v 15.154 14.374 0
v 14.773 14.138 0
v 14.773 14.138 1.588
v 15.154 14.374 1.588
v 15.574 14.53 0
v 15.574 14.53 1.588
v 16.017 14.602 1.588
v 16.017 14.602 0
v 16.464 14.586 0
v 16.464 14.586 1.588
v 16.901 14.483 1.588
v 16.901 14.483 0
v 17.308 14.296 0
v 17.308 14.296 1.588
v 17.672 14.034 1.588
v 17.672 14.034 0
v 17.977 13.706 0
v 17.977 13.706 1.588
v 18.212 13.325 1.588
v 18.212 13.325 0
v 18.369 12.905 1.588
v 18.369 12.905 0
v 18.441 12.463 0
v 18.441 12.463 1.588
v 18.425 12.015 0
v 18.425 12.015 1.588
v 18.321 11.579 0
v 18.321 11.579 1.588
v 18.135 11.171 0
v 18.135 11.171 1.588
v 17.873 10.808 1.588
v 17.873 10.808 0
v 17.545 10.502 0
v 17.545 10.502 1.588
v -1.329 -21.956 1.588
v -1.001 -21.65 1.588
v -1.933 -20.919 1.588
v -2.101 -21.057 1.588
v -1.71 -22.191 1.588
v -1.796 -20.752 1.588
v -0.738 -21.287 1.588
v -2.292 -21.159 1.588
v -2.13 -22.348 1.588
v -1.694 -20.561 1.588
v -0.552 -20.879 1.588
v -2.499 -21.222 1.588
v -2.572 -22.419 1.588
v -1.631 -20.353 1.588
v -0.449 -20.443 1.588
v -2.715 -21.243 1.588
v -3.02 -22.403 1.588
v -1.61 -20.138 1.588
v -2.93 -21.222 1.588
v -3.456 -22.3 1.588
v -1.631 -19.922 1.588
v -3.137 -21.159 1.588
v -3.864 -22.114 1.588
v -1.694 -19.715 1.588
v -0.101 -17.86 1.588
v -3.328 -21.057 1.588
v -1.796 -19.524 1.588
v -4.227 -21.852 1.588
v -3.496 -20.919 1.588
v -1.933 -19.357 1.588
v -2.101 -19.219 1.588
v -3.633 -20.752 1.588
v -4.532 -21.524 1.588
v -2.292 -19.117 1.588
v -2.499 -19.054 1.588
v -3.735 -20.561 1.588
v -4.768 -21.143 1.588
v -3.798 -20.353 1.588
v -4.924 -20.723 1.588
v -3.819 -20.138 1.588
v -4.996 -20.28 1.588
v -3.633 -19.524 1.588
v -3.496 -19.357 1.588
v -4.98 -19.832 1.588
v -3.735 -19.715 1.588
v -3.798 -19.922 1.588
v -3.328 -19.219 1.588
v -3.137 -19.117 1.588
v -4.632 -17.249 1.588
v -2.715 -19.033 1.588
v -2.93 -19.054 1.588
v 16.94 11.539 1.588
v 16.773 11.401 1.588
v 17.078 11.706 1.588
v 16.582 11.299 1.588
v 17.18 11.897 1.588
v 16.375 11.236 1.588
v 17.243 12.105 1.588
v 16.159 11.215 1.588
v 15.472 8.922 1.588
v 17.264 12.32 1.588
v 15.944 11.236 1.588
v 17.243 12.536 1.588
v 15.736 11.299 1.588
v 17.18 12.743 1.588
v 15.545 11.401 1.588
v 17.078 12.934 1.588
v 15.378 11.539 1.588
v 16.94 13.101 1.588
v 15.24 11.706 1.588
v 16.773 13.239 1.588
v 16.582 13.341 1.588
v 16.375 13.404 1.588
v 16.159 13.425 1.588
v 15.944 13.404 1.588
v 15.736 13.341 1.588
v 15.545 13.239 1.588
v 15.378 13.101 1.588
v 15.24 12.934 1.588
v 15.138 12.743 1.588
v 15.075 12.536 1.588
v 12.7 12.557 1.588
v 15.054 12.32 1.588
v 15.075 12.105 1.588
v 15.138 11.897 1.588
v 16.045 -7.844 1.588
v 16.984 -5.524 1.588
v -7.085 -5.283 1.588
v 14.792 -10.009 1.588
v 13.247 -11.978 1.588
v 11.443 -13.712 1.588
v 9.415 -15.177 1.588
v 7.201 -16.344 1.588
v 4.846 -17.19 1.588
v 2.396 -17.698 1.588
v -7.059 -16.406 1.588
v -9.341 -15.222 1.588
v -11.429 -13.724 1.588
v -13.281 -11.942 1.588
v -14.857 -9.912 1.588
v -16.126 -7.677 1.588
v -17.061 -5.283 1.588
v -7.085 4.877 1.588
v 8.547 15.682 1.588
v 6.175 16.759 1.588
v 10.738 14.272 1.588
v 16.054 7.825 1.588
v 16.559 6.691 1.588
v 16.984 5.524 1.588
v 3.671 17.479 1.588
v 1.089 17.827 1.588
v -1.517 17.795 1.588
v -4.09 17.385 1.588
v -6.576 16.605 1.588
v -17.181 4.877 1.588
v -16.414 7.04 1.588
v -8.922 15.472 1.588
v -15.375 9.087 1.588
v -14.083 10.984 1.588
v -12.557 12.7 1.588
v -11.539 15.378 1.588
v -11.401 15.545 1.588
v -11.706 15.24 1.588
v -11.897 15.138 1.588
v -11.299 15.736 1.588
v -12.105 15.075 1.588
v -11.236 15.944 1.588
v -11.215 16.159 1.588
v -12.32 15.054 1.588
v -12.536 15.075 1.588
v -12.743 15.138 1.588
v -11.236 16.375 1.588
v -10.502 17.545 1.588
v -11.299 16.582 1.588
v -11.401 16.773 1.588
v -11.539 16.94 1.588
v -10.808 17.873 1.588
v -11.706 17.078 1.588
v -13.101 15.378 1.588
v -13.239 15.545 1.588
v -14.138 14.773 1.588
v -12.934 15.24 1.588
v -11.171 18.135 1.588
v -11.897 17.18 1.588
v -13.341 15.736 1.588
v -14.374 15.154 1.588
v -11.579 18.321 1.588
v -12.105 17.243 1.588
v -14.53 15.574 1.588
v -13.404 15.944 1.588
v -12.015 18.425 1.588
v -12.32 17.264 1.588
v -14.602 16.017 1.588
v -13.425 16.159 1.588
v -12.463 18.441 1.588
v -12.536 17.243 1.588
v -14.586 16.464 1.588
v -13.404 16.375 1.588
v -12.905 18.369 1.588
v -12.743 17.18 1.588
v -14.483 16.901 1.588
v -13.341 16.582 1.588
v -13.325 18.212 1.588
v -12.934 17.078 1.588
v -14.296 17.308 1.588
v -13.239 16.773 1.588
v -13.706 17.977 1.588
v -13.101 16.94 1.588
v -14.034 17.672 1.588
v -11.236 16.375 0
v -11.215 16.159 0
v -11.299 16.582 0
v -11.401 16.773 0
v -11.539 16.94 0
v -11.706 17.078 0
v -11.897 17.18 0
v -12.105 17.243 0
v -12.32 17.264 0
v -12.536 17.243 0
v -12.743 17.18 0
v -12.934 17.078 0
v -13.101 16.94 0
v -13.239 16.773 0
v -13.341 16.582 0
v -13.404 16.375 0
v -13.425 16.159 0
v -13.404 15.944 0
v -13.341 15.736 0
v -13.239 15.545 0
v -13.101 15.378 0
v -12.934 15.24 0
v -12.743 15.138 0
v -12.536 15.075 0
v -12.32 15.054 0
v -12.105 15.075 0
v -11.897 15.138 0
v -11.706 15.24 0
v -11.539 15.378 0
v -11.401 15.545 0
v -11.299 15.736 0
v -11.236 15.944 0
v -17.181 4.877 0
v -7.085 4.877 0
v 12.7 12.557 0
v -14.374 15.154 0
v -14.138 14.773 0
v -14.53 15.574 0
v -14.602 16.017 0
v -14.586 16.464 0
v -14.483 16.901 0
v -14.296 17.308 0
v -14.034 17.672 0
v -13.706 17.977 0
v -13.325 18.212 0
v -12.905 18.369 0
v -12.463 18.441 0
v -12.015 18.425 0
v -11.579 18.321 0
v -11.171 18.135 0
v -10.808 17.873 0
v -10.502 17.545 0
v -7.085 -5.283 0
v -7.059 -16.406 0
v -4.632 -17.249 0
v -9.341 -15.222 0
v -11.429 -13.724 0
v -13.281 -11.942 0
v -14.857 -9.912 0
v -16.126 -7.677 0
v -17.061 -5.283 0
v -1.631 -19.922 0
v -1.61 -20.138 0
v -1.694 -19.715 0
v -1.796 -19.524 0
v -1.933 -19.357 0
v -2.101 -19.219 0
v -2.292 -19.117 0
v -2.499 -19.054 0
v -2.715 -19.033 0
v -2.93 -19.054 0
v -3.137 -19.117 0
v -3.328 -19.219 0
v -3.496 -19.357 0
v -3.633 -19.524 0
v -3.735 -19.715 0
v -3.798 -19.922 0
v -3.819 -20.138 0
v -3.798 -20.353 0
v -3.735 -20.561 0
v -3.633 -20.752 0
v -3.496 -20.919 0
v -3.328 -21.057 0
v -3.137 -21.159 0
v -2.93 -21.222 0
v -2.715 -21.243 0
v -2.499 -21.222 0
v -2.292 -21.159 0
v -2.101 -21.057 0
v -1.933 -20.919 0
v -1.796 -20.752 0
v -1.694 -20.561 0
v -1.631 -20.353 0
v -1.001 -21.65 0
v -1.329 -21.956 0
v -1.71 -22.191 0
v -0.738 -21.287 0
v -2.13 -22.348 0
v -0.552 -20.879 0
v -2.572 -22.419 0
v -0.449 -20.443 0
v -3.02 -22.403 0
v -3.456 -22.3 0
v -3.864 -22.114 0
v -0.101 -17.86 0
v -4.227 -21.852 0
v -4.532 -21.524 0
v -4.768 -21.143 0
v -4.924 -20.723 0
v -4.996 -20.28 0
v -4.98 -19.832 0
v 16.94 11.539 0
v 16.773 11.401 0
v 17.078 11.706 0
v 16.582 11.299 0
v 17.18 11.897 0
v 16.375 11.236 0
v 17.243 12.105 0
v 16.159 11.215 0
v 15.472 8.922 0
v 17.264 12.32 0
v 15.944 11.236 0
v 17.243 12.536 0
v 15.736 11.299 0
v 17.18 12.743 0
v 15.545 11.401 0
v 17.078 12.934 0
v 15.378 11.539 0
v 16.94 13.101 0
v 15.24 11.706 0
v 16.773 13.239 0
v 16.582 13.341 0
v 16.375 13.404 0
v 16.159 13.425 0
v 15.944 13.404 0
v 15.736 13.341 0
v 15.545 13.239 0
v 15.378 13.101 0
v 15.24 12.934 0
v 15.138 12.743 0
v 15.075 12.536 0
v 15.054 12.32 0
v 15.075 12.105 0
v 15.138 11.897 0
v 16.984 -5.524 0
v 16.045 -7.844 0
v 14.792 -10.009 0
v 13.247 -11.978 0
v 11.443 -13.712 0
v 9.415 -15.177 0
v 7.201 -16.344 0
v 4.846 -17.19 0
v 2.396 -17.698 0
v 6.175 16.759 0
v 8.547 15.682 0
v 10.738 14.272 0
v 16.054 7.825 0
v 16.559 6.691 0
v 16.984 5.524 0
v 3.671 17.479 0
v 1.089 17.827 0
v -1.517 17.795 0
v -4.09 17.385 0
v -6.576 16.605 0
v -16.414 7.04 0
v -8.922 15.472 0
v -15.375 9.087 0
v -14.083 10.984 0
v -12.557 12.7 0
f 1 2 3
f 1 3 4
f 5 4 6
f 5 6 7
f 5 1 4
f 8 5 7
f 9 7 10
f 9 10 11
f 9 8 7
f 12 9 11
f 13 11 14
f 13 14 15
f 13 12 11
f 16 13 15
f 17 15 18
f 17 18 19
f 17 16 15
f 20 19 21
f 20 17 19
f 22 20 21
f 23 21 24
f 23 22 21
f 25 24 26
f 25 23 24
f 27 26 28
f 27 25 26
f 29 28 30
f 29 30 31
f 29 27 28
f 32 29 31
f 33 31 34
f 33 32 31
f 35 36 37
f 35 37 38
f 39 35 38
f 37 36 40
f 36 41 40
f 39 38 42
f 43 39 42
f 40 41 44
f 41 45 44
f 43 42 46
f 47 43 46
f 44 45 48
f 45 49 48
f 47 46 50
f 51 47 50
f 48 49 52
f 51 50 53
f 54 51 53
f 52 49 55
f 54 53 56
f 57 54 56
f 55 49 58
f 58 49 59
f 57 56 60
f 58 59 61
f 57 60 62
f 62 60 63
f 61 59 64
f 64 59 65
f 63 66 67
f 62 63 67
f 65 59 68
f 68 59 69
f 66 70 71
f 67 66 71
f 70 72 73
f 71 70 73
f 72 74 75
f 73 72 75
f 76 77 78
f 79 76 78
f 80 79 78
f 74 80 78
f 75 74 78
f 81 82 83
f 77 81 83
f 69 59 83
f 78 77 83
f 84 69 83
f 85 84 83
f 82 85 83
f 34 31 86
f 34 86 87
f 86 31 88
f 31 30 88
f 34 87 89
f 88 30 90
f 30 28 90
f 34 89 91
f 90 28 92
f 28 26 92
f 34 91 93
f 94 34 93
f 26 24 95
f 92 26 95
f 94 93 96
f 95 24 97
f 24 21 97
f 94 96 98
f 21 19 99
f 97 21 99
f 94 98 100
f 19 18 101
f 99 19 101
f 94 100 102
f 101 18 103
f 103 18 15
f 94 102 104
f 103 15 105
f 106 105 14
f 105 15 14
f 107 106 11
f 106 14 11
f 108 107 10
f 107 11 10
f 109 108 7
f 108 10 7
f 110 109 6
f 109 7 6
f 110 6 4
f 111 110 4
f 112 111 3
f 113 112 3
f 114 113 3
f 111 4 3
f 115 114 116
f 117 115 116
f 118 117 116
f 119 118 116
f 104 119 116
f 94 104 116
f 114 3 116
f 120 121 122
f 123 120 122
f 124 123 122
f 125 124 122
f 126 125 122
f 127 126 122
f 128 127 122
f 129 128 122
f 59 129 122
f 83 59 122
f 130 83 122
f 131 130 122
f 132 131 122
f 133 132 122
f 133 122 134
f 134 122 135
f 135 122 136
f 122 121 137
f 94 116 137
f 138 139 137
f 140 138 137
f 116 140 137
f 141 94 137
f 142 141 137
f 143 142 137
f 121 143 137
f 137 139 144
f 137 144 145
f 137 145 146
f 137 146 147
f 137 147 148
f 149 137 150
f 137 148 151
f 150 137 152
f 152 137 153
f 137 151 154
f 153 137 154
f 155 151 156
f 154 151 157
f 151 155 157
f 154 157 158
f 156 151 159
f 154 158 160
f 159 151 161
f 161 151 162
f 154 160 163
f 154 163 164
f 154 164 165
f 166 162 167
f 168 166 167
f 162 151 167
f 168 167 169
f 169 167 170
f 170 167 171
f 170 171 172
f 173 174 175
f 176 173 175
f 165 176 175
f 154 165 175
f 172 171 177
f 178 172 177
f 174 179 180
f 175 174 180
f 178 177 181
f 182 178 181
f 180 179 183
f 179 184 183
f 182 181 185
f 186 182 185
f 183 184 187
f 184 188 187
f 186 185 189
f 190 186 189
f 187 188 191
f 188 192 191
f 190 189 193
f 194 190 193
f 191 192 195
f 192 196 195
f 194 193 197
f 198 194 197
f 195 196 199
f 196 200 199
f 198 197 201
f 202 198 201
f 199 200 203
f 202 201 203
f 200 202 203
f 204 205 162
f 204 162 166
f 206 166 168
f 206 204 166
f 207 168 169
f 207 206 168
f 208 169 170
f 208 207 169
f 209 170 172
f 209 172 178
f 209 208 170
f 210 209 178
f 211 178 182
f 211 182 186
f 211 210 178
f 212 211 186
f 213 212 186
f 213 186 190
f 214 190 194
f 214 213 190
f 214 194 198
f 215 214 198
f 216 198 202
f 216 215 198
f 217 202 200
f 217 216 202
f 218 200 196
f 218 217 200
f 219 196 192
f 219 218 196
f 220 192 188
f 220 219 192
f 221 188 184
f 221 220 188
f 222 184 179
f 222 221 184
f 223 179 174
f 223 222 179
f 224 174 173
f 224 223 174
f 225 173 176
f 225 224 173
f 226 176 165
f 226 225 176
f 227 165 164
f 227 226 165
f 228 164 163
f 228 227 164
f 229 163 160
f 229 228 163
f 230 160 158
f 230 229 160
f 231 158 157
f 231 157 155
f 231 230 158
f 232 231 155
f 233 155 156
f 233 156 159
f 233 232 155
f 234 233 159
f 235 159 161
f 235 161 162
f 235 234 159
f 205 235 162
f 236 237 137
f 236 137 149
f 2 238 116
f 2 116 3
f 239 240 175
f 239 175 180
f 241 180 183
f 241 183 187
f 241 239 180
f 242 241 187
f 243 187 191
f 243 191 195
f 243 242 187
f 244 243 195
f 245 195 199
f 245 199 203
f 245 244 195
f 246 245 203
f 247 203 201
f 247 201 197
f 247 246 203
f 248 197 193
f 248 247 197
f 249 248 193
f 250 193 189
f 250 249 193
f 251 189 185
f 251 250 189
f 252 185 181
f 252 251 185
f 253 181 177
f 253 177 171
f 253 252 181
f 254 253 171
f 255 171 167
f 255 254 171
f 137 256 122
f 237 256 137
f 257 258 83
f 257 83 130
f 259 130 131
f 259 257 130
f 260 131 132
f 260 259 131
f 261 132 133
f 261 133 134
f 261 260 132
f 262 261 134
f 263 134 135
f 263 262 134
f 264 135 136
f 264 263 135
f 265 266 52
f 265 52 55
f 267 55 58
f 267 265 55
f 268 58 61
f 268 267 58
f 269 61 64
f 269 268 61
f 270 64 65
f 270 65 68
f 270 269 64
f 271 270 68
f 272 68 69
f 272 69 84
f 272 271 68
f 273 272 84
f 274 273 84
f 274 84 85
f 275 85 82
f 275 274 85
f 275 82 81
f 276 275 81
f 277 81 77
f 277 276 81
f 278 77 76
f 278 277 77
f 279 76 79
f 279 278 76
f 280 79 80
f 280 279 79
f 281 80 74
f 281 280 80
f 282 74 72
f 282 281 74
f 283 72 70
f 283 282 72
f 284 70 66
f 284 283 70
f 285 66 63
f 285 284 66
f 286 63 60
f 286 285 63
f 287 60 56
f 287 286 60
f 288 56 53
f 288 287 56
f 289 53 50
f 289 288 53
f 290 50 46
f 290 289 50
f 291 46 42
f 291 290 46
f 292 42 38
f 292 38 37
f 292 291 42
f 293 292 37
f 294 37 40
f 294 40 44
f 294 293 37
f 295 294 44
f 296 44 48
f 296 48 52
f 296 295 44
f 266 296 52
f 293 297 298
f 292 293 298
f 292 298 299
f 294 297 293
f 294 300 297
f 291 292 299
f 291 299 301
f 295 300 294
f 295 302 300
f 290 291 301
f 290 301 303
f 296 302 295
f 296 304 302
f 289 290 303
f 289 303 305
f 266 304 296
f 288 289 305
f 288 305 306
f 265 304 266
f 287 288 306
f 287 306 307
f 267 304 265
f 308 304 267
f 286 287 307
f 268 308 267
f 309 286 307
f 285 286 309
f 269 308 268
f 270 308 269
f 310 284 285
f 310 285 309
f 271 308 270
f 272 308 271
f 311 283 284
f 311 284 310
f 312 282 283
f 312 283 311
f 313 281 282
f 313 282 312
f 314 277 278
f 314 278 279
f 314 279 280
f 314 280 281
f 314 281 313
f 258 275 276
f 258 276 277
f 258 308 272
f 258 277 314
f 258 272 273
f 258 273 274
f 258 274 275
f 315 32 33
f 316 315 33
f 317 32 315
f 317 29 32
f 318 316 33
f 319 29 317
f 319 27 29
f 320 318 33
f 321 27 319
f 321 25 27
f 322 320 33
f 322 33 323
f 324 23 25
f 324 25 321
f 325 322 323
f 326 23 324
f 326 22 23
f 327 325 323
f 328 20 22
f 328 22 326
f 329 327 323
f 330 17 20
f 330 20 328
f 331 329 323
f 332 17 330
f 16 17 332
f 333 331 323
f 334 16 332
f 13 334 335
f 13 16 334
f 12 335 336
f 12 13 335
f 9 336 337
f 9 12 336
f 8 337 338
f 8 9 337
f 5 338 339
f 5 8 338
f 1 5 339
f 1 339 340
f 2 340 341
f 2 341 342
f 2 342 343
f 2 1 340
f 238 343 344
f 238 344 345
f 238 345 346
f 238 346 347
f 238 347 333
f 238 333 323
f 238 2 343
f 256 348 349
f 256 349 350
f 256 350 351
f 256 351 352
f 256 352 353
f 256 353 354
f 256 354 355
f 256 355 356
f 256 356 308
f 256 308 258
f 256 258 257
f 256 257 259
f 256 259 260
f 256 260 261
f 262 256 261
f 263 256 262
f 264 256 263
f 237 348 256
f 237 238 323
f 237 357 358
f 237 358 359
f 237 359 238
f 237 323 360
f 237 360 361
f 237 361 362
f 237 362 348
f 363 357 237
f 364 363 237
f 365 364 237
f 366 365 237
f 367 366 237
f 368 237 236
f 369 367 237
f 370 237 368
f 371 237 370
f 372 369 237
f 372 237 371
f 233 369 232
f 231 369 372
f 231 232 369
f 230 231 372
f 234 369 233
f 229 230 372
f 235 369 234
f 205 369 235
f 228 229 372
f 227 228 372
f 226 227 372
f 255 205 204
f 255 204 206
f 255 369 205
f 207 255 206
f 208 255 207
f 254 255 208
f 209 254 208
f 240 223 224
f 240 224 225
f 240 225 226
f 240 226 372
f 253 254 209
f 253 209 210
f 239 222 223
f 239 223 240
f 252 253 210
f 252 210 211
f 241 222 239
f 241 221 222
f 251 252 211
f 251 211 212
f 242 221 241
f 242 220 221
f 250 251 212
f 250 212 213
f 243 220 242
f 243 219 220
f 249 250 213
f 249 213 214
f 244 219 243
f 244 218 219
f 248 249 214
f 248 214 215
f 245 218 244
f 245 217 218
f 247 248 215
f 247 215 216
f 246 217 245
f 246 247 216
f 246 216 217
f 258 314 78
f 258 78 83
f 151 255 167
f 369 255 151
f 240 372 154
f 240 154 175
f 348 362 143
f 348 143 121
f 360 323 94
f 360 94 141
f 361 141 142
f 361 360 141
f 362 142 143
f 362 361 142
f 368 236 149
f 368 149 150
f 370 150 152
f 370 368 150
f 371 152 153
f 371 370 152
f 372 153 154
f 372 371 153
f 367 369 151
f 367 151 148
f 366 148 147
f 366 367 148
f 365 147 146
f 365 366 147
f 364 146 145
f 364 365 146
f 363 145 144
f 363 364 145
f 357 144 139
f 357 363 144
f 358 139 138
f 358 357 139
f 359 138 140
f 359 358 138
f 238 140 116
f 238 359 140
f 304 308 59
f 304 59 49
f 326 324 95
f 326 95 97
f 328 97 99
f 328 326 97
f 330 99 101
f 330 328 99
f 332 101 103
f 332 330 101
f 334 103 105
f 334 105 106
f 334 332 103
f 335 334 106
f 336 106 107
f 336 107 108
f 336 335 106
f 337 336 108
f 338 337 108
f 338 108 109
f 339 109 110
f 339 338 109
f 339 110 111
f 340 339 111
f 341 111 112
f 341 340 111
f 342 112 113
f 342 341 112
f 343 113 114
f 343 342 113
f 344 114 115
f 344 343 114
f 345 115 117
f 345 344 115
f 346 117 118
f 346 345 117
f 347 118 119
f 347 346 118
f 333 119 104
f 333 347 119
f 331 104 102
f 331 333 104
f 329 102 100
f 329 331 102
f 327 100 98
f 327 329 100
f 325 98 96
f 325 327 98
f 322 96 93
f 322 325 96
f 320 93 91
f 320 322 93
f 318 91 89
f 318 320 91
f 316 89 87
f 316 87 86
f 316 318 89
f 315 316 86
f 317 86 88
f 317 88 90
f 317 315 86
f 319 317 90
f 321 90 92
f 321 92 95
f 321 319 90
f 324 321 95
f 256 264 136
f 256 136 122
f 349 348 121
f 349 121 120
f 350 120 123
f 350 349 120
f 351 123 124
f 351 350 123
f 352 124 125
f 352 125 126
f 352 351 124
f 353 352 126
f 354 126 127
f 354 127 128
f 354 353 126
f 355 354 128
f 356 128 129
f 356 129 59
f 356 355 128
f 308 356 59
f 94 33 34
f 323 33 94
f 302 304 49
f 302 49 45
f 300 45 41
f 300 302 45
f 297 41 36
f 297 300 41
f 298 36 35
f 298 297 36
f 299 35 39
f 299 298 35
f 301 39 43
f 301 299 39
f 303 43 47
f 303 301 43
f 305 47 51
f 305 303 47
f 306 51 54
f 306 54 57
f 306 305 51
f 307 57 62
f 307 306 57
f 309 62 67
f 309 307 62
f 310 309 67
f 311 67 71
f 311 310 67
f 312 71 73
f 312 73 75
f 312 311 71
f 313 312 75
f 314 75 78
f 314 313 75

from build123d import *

# Parameters (mm, degrees)
SKETCH1_R           = 1.1049
BOSS_EXTRUDE1_DEPTH = 1.5875


with BuildPart() as part:
    # Sketch1 → Boss-Extrude1 (new body)
    with BuildSketch(Plane.XY):
        with BuildLine():
            Line((-7.084965338, 4.8768), (-17.181244816, 4.8768))
            ThreePointArc((-17.181244816, 4.8768), (-15.375234721, 9.087381854), (-12.557442768, 12.699959952))
            Line((-12.557442768, 12.699959952), (-14.138046409, 14.773078207))
            ThreePointArc((-14.138046409, 14.773078207), (-13.706164911, 17.976993058), (-10.502250061, 17.54511156))
            Line((-10.502250061, 17.54511156), (-8.92164642, 15.471993305))
            ThreePointArc((-8.92164642, 15.471993305), (2.385909574, 17.699880993), (12.699959952, 12.557442768))
            Line((12.699959952, 12.557442768), (14.773078207, 14.138046409))
            ThreePointArc((14.773078207, 14.138046409), (17.976993058, 13.706164911), (17.54511156, 10.502250061))
            Line((17.54511156, 10.502250061), (15.471993305, 8.92164642))
            ThreePointArc((15.471993305, 8.92164642), (16.316677959, 7.26253207), (16.984058744, 5.5245))
            Line((16.984058744, 5.5245), (16.984058744, -5.5245))
            ThreePointArc((16.984058744, -5.5245), (10.454687446, -14.480257667), (-0.100774867, -17.859680739))
            Line((-0.100774867, -17.859680739), (-0.449035291, -20.443252268))
            ThreePointArc((-0.449035291, -20.443252268), (-3.019931544, -22.40337585), (-4.980055125, -19.832479597))
            Line((-4.980055125, -19.832479597), (-4.631794702, -17.248908067))
            ThreePointArc((-4.631794702, -17.248908067), (-12.386896286, -12.866357374), (-17.060660873, -5.2832))
            Line((-17.060660873, -5.2832), (-7.084965338, -5.2832))
            Line((-7.084965338, -5.2832), (-7.084965338, 4.8768))
        make_face()
        with Locations((-2.714545208, -20.137865932)):
            Circle(SKETCH1_R, mode=Mode.SUBTRACT)
        with Locations((-12.320148235, 16.159094884)):
            Circle(SKETCH1_R, mode=Mode.SUBTRACT)
        with Locations((16.159094884, 12.320148235)):
            Circle(SKETCH1_R, mode=Mode.SUBTRACT)
    extrude(amount=BOSS_EXTRUDE1_DEPTH)


solid = part.part
